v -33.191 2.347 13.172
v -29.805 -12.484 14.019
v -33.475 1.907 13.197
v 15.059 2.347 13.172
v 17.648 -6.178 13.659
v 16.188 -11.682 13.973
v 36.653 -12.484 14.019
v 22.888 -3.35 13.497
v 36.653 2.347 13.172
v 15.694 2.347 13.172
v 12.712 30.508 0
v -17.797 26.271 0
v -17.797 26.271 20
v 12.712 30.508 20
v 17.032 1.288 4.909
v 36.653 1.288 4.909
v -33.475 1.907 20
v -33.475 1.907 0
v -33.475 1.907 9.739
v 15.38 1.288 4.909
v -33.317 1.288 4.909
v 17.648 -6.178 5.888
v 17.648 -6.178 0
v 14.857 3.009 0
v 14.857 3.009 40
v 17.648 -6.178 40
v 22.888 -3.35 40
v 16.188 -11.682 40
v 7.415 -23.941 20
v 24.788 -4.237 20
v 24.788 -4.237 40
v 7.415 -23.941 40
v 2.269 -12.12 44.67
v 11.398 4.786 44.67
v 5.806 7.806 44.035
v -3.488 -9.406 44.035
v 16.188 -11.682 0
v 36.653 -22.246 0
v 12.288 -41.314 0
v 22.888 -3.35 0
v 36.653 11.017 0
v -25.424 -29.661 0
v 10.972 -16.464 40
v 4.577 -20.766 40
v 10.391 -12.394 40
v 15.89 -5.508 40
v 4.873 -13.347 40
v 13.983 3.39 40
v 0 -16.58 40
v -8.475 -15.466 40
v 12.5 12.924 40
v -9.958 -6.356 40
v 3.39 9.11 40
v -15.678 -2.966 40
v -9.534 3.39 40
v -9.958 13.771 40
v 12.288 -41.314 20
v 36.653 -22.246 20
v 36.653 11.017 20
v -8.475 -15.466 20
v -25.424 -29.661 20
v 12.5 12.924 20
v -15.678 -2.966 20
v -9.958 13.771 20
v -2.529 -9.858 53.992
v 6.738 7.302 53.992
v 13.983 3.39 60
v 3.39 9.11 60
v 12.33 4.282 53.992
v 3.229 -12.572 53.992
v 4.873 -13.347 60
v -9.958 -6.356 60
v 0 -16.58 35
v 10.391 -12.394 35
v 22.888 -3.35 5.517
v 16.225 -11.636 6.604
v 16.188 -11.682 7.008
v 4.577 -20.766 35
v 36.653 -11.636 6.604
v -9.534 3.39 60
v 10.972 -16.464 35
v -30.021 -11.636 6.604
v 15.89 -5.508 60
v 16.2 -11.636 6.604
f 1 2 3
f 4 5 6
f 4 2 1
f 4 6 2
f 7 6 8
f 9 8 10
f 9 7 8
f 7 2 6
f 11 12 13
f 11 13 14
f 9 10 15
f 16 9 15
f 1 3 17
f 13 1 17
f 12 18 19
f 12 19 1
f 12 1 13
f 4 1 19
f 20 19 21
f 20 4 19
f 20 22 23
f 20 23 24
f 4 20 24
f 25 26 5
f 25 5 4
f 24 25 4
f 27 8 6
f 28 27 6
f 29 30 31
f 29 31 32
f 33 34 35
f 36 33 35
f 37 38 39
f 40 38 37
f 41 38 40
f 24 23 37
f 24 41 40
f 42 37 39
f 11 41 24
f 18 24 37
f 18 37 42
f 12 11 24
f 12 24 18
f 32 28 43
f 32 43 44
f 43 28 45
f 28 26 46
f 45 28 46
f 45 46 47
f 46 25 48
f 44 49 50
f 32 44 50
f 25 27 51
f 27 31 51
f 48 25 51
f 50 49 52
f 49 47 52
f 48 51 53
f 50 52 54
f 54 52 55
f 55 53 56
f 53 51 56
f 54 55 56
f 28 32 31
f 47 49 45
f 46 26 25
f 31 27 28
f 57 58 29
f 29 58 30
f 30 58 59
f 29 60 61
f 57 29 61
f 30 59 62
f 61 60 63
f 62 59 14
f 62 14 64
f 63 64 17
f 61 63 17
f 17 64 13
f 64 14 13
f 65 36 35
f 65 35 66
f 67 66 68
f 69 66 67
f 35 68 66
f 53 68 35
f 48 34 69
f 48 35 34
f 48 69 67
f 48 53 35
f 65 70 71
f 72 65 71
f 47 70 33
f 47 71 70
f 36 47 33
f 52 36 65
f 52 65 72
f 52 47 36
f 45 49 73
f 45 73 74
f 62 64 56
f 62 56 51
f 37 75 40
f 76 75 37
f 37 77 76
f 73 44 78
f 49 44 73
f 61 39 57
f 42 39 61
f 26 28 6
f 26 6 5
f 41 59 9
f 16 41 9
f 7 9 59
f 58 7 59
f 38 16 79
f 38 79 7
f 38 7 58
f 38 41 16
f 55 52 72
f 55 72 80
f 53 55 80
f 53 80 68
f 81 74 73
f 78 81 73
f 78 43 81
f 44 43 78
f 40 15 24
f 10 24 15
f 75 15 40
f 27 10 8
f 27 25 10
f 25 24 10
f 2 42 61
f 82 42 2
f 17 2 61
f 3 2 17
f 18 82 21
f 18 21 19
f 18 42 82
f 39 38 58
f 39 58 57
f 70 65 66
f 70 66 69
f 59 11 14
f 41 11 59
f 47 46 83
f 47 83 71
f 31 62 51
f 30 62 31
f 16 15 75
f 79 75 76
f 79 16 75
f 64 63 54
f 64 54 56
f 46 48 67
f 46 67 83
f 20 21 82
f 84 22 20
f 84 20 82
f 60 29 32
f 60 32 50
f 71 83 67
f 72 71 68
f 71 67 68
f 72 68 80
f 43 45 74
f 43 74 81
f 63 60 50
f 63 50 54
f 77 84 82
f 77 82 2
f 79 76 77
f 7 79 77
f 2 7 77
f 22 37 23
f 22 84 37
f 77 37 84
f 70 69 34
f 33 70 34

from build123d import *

# Parameters (mm, degrees)
PAD_DEPTH       = 20
PAD001_DEPTH    = 20
PAD002_DEPTH    = 20
POCKET_DEPTH    = 5
POCKET001_DEPTH = 40.001
POCKET002_DEPTH = 61.885198
POCKET003_DEPTH = 70.128117


with BuildPart() as part:
    # Sketch → Pad (new body)
    with BuildSketch(Plane.XY):
        Polygon((-17.796612, 26.271189), (12.711864, 30.508476), (36.652542, 11.016947), (36.652542, -22.245762), (12.288136, -41.31356), (-25.423729, -29.661018), (-33.474575, 1.906782), align=None)
    extrude(amount=PAD_DEPTH)

    # Sketch001 (on Face9 of Pad) → Pad001 (join)
    with BuildSketch(Plane.XY.offset(20)):
        Polygon((-8.474573, -15.466103), (-15.677964, -2.966103), (-9.957623, 13.771189), (12.499998, 12.923729), (24.788139, -4.237288), (7.415263, -23.94068), align=None)
    extrude(amount=PAD001_DEPTH)

    # Sketch002 (on Face16 of Pad001) → Pad002 (join)
    with BuildSketch(Plane.XY.offset(40)):
        Polygon((4.872886, -13.347459), (-9.957623, -6.355932), (-9.533896, 3.389829), (3.389833, 9.11017), (13.983051, 3.389829), (15.889828, -5.508473), align=None)
    extrude(amount=PAD002_DEPTH)

    # Sketch003 (on Face16 of Pad002) → Pocket (cut)
    with BuildSketch(Plane.XY.offset(40)):
        Polygon((4.57688, -20.765705), (0, -16.579855), (10.390564, -12.394002), (10.971933, -16.463581), align=None)
    extrude(amount=-POCKET_DEPTH, mode=Mode.SUBTRACT)

    # Sketch004 (on Face16 of Pocket) → Pocket001 (cut, through all)
    with BuildSketch(Plane.XY.offset(40)):
        Polygon((17.64828, -6.177723), (14.857347, 3.009472), (22.888026, -3.350244), (16.187607, -11.682368), align=None)
    extrude(amount=-POCKET001_DEPTH, mode=Mode.SUBTRACT)

    # Sketch005 (on Face28 of Pocket001) → Pocket002 (cut, through all)
    with BuildSketch(Plane(origin=(4.574148, 8.47064, 0), x_dir=(-0.879905, 0.475149, 0), z_dir=(0.475149, 0.879905, 0))):
        Polygon((-8.814835, 53.992447), (-7.755517, 44.67041), (-1.399587, 44.034817), (-2.458905, 53.992447), align=None)
    extrude(amount=-POCKET002_DEPTH, mode=Mode.SUBTRACT)

    # Sketch006 (on Face7 of Pocket002) → Pocket003 (cut, through all)
    with BuildSketch(Plane.YZ.offset(36.652542)):
        Polygon((-11.636175, 6.603847), (-12.483627, 14.019101), (2.346878, 13.171643), (1.28756, 4.908932), align=None)
    extrude(amount=-POCKET003_DEPTH, mode=Mode.SUBTRACT)


solid = part.part
